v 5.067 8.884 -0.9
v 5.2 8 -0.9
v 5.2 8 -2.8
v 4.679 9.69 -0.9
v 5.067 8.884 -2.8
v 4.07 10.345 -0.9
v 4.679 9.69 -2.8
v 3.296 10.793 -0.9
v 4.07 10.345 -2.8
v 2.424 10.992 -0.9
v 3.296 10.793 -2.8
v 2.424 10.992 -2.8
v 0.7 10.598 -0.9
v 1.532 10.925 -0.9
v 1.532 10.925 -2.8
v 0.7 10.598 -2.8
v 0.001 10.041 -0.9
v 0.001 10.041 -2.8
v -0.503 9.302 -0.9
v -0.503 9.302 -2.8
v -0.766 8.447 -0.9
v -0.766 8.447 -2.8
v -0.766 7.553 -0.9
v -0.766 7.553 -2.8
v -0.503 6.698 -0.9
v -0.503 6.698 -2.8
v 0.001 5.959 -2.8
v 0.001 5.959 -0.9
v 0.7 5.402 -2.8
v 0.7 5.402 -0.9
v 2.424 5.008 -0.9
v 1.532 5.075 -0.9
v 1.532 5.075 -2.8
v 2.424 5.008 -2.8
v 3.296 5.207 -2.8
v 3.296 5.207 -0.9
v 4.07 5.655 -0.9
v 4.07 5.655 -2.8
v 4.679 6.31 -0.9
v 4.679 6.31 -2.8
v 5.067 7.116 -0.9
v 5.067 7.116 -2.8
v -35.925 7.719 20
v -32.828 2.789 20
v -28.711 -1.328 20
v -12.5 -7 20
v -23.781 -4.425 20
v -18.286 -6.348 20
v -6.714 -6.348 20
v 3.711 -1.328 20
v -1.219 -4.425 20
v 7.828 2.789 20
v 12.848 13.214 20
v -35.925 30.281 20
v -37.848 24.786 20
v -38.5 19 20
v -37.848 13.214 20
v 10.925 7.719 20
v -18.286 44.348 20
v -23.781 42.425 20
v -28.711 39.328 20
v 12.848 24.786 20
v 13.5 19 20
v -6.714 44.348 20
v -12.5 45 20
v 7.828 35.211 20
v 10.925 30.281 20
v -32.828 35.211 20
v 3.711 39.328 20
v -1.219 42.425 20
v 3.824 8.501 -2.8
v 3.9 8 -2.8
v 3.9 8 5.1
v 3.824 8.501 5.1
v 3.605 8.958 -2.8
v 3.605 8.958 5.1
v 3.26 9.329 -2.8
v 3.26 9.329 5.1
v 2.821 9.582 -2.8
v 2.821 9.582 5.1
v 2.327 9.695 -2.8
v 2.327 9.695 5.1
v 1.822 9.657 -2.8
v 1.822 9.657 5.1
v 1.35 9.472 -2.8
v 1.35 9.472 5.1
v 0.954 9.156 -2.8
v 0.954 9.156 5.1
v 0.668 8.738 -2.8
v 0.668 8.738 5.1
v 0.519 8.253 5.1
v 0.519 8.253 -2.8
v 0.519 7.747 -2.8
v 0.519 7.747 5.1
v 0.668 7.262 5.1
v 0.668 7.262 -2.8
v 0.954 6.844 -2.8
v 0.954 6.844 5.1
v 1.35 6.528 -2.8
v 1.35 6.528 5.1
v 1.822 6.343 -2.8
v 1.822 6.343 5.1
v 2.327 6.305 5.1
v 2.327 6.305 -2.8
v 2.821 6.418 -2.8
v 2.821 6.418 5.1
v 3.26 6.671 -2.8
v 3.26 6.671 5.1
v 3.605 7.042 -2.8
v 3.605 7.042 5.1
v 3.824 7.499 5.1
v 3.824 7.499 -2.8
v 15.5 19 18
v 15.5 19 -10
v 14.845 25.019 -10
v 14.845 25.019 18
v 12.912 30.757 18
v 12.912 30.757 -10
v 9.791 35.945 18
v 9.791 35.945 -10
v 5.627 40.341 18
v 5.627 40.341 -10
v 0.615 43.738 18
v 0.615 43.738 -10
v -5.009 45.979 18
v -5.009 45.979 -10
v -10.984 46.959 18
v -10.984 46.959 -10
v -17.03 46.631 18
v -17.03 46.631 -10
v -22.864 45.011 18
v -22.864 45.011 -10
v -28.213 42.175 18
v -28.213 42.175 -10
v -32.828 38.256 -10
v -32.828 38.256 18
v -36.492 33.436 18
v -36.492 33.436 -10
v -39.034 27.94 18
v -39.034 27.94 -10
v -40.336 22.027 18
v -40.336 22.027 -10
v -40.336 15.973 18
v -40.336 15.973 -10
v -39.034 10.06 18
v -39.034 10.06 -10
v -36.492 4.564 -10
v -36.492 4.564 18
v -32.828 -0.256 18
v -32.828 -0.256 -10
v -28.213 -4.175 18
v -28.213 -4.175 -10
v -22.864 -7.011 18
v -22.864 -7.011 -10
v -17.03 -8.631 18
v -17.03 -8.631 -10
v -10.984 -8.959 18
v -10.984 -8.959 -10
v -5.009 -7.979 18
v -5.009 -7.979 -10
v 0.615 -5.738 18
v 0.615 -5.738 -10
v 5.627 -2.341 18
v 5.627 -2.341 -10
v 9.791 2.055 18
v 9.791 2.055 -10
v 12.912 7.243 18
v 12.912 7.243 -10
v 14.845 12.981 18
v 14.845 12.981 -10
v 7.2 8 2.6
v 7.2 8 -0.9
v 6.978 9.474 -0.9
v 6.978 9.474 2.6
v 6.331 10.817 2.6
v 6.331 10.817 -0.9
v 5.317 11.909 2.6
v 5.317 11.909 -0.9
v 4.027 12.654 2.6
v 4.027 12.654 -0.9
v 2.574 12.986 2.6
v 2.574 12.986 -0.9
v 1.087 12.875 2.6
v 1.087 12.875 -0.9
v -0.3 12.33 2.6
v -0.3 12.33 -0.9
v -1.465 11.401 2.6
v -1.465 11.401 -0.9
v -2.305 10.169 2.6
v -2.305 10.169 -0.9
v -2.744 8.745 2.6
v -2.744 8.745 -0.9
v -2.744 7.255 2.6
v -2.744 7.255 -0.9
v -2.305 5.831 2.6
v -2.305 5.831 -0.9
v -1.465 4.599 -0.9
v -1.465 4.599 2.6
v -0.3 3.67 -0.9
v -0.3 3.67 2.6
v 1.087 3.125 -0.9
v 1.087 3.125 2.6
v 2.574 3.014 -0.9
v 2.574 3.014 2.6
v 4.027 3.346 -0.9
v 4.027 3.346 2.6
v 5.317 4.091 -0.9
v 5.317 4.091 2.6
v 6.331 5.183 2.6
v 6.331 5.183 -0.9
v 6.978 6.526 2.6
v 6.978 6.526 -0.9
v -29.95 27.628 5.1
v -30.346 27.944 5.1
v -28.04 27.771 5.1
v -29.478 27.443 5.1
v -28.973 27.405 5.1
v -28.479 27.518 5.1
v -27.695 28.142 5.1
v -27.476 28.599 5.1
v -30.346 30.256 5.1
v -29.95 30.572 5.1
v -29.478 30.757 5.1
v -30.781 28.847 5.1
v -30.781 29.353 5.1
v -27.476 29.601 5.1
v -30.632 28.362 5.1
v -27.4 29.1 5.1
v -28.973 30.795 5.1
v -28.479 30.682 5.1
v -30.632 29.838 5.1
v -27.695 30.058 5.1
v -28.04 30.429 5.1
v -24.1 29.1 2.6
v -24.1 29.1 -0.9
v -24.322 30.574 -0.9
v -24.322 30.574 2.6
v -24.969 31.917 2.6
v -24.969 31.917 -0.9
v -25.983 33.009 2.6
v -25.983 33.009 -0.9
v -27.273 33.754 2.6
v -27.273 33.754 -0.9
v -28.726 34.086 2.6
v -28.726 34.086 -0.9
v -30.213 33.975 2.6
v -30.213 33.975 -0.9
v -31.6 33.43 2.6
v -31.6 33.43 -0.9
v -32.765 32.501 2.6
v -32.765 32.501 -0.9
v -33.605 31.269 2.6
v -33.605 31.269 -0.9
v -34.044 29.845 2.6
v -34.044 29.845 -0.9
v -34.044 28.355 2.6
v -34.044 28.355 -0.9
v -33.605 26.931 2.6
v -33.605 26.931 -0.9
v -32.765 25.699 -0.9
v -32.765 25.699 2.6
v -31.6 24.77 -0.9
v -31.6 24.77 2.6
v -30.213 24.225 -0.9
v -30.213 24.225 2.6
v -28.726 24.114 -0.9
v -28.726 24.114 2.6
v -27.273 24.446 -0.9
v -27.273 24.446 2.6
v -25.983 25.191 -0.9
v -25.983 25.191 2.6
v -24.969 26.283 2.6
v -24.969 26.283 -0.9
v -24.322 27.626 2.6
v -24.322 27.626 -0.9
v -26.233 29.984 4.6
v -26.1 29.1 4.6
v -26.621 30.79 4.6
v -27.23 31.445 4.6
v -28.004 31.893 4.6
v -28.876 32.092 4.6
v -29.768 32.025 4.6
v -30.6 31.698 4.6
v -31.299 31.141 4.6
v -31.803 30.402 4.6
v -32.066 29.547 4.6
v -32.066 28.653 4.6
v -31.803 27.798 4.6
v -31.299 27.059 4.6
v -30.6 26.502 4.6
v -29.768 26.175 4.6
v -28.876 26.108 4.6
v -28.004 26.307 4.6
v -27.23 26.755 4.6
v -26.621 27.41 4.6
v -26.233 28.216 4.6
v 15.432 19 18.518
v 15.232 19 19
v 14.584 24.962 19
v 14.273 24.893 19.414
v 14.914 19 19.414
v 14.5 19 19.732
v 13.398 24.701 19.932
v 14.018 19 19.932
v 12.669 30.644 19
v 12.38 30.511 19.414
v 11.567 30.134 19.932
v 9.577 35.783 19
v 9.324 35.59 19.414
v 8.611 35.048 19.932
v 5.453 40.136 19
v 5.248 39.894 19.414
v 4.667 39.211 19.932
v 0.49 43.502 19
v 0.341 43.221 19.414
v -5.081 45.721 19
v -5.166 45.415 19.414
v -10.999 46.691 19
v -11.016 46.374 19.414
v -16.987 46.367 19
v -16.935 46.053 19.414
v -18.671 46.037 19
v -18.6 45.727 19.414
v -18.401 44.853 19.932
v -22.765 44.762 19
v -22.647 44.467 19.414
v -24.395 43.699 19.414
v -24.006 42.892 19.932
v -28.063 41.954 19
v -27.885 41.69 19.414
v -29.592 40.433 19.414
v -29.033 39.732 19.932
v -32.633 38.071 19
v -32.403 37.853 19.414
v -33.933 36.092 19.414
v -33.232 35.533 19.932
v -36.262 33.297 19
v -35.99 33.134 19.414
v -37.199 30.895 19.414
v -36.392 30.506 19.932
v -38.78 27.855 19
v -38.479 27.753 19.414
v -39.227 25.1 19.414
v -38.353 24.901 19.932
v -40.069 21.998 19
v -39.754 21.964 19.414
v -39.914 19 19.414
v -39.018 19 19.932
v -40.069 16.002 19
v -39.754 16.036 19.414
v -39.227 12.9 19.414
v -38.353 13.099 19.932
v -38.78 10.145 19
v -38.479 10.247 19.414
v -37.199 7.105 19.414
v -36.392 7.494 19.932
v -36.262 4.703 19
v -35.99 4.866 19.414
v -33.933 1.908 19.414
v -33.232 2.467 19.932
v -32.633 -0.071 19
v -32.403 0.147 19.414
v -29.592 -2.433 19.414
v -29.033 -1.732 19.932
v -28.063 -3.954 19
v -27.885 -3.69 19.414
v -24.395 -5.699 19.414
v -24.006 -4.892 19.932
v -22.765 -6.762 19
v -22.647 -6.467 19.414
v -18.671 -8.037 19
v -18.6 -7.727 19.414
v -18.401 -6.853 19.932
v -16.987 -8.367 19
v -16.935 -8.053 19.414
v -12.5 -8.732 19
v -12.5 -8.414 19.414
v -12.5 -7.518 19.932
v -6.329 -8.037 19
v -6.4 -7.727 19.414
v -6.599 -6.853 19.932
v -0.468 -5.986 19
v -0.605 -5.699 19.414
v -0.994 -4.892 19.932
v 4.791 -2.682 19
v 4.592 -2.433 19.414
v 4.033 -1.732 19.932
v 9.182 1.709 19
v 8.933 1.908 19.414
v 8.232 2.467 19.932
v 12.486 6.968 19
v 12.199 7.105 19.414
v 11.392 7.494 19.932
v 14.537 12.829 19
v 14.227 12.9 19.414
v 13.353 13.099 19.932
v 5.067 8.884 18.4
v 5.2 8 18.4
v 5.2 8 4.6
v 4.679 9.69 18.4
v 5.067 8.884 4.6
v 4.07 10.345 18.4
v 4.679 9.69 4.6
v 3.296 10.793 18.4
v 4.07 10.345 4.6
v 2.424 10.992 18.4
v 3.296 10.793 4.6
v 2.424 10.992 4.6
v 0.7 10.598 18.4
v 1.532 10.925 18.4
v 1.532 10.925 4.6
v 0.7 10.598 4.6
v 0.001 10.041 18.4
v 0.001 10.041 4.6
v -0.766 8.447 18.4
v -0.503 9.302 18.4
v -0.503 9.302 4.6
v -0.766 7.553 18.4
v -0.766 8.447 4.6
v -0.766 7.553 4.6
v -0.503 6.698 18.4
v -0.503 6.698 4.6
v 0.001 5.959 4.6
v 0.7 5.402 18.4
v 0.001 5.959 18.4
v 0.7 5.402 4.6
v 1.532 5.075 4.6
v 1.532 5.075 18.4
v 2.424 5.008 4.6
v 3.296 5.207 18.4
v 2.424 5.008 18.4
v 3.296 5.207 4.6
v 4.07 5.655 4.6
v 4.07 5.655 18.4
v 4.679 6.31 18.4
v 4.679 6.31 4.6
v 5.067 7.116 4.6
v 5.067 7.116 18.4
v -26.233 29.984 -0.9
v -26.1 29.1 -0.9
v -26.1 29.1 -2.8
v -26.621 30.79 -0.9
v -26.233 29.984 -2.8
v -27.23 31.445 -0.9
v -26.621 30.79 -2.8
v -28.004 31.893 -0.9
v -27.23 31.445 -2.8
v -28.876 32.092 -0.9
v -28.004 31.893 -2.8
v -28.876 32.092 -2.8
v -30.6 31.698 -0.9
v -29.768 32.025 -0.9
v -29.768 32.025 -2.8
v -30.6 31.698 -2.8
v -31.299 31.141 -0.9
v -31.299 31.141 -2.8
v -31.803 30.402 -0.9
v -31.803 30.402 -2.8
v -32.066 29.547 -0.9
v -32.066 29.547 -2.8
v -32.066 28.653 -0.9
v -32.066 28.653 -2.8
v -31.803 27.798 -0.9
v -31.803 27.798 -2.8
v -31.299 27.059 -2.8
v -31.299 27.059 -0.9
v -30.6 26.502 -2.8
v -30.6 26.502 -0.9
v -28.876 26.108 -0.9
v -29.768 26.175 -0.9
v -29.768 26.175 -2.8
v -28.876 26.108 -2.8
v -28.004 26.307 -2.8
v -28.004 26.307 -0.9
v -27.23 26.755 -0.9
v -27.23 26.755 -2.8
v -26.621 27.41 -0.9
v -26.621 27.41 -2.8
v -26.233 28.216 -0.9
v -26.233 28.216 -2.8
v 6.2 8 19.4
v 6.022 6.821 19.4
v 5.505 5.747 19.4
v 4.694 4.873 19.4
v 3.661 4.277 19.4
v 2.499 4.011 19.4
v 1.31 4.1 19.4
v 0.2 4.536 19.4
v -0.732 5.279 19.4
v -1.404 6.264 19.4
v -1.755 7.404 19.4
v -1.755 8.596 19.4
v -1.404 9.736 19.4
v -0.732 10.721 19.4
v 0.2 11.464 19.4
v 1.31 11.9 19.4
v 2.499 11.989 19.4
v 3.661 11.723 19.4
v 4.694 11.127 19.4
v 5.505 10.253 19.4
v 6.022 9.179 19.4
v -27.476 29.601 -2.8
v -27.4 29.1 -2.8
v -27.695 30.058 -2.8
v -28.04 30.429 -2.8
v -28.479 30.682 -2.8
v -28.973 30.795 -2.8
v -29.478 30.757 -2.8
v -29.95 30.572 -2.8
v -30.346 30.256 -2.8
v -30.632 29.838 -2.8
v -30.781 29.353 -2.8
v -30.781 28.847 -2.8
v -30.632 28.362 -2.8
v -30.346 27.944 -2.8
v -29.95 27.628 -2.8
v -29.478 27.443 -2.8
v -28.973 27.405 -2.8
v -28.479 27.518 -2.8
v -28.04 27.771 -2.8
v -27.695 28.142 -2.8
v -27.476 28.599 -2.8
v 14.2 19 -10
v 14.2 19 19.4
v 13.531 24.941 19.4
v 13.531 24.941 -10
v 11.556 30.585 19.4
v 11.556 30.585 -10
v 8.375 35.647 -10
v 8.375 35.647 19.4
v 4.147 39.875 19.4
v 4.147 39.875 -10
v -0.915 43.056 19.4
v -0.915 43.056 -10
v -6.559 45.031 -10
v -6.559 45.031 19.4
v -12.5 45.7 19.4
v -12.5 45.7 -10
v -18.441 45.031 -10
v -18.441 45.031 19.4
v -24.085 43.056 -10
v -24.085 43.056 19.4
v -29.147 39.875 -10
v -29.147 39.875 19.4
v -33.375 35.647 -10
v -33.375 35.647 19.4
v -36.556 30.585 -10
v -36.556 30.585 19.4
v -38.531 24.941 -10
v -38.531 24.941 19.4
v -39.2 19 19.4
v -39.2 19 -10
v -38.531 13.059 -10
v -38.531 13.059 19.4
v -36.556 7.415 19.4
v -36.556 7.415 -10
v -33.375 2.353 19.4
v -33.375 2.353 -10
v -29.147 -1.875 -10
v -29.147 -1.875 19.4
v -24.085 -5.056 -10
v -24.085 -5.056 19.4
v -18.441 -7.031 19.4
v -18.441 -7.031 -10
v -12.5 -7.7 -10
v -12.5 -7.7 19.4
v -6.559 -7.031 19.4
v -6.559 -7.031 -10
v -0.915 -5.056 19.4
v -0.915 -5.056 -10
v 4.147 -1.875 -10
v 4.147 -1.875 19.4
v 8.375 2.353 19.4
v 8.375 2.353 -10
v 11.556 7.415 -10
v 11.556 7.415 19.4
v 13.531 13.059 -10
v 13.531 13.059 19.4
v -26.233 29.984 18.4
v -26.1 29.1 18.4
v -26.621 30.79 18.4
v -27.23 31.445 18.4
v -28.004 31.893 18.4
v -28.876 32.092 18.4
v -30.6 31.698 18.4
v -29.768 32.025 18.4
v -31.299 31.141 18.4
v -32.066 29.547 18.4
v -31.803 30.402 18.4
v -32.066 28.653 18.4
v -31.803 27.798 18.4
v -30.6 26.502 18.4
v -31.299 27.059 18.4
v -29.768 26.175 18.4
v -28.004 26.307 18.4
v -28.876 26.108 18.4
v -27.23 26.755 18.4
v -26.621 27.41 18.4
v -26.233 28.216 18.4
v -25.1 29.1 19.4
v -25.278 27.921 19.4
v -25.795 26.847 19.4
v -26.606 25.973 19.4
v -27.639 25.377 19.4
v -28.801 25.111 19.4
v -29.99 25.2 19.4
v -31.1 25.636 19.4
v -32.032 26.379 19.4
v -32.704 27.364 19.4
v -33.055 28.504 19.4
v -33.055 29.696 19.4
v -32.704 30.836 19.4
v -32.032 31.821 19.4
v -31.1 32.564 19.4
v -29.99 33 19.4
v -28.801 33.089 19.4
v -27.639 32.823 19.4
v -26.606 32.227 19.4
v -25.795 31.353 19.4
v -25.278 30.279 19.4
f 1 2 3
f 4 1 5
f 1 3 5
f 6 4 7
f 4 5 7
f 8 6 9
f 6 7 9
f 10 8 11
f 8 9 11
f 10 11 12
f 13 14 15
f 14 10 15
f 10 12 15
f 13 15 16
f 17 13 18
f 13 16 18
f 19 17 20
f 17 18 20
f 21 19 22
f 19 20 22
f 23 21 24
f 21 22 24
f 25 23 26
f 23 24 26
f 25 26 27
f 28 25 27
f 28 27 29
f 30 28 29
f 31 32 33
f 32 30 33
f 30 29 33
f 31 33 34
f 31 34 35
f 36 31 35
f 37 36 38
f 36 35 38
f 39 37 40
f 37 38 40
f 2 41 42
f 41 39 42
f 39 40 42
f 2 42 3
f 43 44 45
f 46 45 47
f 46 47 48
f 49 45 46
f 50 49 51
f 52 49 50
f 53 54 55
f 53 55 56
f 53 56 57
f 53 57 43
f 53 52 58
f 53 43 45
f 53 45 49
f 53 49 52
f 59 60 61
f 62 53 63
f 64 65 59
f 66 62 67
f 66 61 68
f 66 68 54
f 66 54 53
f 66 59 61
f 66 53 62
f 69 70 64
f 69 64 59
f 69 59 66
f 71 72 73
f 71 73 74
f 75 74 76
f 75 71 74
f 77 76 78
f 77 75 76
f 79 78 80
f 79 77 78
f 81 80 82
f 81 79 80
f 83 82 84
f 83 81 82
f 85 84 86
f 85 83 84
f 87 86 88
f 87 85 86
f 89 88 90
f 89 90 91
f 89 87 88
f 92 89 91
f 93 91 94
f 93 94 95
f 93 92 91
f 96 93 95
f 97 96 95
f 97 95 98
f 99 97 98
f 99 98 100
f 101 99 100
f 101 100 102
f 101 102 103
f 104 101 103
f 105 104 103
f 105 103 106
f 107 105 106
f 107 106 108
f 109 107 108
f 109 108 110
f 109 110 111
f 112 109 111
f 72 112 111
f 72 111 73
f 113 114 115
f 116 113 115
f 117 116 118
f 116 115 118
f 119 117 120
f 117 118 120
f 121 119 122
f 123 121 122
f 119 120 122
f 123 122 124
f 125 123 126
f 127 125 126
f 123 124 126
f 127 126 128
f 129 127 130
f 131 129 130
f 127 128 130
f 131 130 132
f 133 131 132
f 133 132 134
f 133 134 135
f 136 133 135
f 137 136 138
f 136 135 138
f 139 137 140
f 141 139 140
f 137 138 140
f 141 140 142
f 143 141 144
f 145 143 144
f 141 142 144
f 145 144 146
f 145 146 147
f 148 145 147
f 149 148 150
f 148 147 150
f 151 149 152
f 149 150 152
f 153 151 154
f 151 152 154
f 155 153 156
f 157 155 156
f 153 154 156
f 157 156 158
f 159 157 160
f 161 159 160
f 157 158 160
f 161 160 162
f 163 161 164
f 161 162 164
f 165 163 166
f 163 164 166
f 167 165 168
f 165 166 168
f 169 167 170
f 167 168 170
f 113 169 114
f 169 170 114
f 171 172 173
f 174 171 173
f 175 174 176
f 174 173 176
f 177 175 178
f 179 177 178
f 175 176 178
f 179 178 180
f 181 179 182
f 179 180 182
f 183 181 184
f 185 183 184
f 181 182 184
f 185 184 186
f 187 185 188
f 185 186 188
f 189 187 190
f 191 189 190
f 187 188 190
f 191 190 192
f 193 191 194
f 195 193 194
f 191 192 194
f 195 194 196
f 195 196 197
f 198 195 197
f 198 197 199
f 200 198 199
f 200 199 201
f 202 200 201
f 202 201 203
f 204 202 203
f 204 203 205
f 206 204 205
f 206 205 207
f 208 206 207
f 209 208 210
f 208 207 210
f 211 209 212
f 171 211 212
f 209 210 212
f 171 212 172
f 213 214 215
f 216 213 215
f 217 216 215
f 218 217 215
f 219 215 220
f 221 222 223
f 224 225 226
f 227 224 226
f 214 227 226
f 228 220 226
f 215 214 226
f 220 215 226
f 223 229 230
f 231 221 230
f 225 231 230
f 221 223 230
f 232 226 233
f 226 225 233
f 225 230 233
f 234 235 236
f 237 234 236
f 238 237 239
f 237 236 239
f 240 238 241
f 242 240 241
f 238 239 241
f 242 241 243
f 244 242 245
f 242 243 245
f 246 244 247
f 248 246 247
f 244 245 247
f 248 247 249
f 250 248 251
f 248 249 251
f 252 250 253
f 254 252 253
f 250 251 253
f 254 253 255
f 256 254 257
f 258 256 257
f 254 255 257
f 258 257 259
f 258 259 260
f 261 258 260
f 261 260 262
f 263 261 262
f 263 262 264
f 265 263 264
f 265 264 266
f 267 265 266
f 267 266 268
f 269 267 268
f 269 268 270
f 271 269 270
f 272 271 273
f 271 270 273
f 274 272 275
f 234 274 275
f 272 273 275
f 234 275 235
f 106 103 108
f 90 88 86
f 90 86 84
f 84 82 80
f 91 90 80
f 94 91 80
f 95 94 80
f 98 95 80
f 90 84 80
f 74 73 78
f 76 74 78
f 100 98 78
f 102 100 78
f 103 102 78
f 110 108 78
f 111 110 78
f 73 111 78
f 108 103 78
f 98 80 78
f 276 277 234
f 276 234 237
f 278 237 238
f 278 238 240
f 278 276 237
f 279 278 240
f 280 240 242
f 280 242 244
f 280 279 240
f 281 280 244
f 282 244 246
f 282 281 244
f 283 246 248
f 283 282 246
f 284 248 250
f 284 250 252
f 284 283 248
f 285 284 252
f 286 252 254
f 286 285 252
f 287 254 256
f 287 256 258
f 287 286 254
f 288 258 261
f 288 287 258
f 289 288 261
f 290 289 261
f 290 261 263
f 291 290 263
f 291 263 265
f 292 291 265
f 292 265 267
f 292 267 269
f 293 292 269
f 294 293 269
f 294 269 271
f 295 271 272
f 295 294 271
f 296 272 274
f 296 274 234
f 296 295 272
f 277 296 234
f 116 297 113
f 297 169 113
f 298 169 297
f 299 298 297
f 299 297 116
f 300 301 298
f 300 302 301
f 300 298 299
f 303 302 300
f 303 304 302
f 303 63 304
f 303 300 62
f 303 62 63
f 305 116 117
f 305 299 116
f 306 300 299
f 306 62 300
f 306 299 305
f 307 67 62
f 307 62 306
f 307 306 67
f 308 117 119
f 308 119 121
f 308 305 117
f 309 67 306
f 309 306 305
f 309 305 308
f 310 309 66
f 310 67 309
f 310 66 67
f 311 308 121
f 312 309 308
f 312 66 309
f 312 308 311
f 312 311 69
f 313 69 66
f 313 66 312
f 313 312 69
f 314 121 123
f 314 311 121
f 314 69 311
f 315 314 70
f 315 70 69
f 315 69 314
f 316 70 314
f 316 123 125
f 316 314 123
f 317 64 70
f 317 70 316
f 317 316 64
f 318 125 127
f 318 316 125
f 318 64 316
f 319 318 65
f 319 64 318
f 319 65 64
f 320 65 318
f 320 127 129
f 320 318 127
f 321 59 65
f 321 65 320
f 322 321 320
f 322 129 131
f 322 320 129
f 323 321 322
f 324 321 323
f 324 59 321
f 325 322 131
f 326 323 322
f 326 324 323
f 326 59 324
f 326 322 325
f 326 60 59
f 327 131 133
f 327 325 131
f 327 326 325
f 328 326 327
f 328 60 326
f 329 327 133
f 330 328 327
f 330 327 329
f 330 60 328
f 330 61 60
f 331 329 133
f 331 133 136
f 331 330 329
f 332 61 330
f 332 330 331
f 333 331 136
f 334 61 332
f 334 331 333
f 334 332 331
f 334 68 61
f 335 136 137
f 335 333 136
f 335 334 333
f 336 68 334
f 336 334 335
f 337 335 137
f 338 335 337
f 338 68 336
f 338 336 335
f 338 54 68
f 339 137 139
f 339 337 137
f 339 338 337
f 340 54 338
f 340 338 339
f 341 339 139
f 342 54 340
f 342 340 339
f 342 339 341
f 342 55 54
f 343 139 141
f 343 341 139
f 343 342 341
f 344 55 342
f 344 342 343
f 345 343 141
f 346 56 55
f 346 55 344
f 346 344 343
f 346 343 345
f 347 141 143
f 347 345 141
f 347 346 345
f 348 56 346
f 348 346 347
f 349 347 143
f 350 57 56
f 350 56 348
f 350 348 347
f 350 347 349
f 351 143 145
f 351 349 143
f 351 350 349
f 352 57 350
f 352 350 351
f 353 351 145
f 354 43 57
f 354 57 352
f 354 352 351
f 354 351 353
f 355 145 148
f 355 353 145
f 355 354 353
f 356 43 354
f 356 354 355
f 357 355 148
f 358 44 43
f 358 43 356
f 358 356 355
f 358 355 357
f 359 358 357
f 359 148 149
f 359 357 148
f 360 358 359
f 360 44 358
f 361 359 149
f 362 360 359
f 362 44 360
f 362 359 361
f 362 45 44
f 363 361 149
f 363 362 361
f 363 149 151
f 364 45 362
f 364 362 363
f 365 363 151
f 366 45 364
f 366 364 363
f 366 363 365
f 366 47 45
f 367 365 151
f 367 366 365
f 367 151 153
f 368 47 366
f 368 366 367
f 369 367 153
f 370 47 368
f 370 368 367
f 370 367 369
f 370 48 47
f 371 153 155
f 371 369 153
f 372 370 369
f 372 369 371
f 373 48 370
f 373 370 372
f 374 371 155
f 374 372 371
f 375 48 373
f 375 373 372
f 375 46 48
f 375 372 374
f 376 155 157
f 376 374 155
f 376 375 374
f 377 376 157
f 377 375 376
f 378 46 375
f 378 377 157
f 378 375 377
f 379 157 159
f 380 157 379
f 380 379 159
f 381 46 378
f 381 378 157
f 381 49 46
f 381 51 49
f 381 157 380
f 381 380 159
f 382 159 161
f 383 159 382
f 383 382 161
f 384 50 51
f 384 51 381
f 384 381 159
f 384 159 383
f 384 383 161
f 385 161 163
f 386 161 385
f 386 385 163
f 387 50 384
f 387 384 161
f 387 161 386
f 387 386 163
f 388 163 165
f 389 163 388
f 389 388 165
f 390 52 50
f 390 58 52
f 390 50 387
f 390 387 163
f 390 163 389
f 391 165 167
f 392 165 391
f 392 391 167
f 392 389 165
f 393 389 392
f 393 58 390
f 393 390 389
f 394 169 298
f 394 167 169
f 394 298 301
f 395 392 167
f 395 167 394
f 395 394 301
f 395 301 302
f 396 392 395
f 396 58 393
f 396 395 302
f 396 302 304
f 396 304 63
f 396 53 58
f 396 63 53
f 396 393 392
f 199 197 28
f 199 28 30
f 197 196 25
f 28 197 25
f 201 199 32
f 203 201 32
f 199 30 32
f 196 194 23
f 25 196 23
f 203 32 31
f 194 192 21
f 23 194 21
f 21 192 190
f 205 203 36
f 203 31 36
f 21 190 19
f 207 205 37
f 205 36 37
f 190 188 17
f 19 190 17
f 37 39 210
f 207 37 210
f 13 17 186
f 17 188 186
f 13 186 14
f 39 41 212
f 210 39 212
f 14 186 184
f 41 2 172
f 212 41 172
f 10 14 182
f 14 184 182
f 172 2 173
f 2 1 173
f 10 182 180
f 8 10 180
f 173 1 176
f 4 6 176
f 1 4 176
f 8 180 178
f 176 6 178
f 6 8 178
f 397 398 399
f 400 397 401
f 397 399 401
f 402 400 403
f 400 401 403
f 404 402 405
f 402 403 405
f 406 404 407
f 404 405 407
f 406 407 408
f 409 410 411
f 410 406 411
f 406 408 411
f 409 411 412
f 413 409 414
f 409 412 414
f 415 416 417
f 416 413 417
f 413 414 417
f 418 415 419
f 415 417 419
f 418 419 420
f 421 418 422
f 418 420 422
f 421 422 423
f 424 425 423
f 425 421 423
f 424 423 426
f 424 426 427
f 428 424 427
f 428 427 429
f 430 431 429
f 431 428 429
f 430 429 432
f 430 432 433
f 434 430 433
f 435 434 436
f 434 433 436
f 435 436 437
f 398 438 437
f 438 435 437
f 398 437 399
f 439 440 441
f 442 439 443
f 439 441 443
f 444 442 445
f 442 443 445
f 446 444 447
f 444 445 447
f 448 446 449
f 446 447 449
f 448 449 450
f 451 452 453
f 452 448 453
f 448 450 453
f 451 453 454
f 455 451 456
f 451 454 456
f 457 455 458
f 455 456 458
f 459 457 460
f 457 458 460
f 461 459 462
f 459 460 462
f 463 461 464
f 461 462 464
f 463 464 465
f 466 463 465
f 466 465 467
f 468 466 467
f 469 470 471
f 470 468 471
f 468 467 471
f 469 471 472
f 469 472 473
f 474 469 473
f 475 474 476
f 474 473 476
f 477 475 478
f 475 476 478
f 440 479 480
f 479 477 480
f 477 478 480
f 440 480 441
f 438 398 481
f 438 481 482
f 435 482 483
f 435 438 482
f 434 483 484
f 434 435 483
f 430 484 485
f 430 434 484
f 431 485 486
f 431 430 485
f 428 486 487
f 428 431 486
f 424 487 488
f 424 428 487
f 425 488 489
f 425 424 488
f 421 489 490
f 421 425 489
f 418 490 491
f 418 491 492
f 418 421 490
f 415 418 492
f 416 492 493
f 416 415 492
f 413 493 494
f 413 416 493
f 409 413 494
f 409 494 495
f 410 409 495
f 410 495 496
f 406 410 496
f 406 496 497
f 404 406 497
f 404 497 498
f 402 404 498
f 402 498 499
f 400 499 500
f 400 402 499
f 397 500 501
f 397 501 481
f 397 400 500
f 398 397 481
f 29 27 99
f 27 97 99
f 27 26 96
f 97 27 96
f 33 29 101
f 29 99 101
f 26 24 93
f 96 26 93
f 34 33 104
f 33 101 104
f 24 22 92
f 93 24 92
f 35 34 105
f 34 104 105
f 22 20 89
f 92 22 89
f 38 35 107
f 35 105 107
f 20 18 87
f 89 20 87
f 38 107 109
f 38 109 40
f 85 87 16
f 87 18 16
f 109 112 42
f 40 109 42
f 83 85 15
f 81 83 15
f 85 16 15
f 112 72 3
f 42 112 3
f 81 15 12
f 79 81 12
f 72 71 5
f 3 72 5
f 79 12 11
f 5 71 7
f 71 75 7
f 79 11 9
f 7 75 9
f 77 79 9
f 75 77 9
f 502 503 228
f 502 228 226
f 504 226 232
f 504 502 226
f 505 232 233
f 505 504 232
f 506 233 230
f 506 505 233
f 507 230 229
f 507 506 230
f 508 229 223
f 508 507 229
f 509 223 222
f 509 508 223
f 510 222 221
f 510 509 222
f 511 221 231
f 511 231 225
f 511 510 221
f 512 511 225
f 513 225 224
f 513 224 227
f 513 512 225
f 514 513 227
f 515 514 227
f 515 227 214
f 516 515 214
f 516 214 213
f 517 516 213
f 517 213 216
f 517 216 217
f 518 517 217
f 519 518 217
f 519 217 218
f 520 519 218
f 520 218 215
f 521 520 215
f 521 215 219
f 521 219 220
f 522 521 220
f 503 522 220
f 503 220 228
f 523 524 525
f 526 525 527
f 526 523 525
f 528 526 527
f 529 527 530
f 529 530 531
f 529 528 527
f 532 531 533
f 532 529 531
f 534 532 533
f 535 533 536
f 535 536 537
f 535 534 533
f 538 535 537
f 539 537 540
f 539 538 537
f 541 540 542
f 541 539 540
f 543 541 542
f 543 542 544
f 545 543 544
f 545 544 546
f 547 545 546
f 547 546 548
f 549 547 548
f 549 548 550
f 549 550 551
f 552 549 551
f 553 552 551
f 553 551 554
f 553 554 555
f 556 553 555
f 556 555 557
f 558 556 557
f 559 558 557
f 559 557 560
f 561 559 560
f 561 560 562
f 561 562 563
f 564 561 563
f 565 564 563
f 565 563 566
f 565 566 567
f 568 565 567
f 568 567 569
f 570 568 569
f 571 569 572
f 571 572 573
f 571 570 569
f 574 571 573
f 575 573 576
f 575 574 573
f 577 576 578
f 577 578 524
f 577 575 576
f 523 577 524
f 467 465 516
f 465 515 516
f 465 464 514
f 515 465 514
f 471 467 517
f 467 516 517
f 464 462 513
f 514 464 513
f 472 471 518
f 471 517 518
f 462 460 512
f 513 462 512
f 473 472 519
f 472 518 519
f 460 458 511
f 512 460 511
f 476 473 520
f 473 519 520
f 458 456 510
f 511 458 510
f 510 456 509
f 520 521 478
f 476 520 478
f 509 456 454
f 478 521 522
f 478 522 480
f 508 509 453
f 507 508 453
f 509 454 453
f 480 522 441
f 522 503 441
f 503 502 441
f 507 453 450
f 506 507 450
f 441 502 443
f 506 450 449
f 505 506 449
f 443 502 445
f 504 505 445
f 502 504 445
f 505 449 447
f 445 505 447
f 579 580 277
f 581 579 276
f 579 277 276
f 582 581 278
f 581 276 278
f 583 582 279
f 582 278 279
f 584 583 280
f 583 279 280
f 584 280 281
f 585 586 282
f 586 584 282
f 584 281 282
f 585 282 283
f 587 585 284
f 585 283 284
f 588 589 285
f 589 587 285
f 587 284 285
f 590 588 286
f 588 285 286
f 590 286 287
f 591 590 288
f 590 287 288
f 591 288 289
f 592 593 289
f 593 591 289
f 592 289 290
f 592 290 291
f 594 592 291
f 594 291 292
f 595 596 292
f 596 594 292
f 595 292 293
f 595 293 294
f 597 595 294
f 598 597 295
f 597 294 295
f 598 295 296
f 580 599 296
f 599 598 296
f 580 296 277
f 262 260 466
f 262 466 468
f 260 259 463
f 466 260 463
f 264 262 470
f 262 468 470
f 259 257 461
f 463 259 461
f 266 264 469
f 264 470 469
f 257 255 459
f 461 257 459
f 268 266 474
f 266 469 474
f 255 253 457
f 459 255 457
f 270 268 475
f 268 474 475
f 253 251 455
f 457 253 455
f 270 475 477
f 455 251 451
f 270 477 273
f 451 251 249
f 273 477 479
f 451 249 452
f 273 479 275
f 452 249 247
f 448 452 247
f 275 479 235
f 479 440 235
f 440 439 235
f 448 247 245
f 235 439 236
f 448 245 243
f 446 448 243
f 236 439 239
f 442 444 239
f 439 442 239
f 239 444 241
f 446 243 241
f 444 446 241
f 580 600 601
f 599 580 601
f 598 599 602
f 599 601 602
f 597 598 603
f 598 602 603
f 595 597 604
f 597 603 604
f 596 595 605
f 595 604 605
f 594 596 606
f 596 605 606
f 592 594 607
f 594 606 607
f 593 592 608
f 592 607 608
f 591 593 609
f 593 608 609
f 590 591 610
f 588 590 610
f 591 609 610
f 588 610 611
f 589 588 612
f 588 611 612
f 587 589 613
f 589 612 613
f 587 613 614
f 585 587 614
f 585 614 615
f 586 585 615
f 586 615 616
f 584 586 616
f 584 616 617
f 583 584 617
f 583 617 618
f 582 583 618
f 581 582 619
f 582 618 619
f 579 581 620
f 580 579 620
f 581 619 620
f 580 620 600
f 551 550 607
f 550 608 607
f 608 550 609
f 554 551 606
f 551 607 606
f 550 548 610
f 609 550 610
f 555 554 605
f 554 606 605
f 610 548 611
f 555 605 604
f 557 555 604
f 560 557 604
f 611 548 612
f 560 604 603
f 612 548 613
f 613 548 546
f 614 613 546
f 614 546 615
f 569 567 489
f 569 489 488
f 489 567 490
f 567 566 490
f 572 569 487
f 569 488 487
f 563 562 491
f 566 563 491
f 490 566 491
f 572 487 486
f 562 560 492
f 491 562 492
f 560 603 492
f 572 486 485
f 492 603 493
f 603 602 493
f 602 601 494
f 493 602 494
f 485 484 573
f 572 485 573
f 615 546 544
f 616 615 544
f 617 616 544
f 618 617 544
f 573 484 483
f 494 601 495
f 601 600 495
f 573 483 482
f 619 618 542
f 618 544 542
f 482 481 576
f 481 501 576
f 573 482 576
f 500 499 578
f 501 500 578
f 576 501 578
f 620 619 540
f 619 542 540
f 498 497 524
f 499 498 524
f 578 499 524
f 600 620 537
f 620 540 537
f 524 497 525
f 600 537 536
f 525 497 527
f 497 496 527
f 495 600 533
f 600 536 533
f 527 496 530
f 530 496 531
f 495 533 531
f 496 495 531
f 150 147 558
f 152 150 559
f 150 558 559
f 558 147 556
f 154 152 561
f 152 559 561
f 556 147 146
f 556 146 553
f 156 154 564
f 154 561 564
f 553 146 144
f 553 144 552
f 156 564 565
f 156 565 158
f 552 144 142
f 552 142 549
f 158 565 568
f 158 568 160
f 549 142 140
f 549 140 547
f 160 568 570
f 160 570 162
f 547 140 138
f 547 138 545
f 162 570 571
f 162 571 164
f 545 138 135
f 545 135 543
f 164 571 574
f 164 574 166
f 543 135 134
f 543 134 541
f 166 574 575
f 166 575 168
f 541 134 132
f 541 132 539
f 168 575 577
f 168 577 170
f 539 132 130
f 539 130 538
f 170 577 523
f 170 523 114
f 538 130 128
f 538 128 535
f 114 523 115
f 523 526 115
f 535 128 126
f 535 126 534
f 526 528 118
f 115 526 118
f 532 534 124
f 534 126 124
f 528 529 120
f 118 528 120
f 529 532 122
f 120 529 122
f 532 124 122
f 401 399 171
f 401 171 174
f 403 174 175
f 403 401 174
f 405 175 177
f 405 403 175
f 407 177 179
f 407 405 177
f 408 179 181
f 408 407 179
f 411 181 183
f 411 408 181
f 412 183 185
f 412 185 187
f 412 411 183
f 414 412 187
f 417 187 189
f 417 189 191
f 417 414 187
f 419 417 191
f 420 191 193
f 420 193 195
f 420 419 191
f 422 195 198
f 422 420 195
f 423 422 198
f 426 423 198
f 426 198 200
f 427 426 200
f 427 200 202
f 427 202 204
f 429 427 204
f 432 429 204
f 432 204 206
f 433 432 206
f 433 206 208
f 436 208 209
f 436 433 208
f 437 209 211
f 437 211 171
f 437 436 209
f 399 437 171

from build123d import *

# Parameters (mm, degrees)
CYLINDER033_R     = 1.7
CYLINDER033_DEPTH = 8.5
CYLINDER036_R     = 5
CYLINDER036_DEPTH = 5.5
CHAMFER008_SIZE   = 2
CYLINDER031_R     = 3
CYLINDER031_DEPTH = 22.5
CYLINDER034_R     = 1.7
CYLINDER034_DEPTH = 8.5
CYLINDER035_R     = 5
CYLINDER035_DEPTH = 5.5
CHAMFER009_SIZE   = 2
CYLINDER032_R     = 3
CYLINDER032_DEPTH = 22.5
CYLINDER029_R     = 26.7
CYLINDER029_DEPTH = 30
CYLINDER030_R     = 28
CYLINDER030_DEPTH = 30
FILLET002_R       = 2
CHAMFER010_SIZE   = 1


with BuildPart() as vaciado_tope014:
    # Cylinder033 → Cylinder033 (new body)
    with BuildSketch(Plane(origin=(2.2, 8, -3.4), x_dir=(1, 0, 0), z_dir=(0, 0, 1))):
        Circle(CYLINDER033_R)
    extrude(amount=CYLINDER033_DEPTH)


with BuildPart() as chamfer008:
    # Cylinder036 → Cylinder036 (new body)
    with BuildSketch(Plane(origin=(2.2, 8, -0.9), x_dir=(1, 0, 0), z_dir=(0, 0, 1))):
        Circle(CYLINDER036_R)
    extrude(amount=CYLINDER036_DEPTH)

    # Chamfer008
    chamfer008_edges = [chamfer008.edges().sort_by_distance(p)[0] for p in [
        (-2.8, 8, 4.6),
    ]]
    chamfer(chamfer008_edges, length=CHAMFER008_SIZE)


with BuildPart() as columna1:
    # Cylinder031 → Cylinder031 (new body)
    with BuildSketch(Plane(origin=(2.2, 8, -2.8), x_dir=(1, 0, 0), z_dir=(0, 0, 1))):
        Circle(CYLINDER031_R)
    extrude(amount=CYLINDER031_DEPTH)

    # Fusion003: union Chamfer008
    add(chamfer008.part)

    # Cut017: cut vaciado tope014
    add(vaciado_tope014.part, mode=Mode.SUBTRACT)


with BuildPart() as vaciado_tope015:
    # Cylinder034 → Cylinder034 (new body)
    with BuildSketch(Plane(origin=(-29.1, 29.1, -3.4), x_dir=(1, 0, 0), z_dir=(0, 0, 1))):
        Circle(CYLINDER034_R)
    extrude(amount=CYLINDER034_DEPTH)


with BuildPart() as chamfer009:
    # Cylinder035 → Cylinder035 (new body)
    with BuildSketch(Plane(origin=(-29.1, 29.1, -0.9), x_dir=(1, 0, 0), z_dir=(0, 0, 1))):
        Circle(CYLINDER035_R)
    extrude(amount=CYLINDER035_DEPTH)

    # Chamfer009
    chamfer009_edges = [chamfer009.edges().sort_by_distance(p)[0] for p in [
        (-34.1, 29.1, 4.6),
    ]]
    chamfer(chamfer009_edges, length=CHAMFER009_SIZE)


with BuildPart() as columna2:
    # Cylinder032 → Cylinder032 (new body)
    with BuildSketch(Plane(origin=(-29.1, 29.1, -2.8), x_dir=(1, 0, 0), z_dir=(0, 0, 1))):
        Circle(CYLINDER032_R)
    extrude(amount=CYLINDER032_DEPTH)

    # Fusion004: union Chamfer009
    add(chamfer009.part)

    # Cut018: cut vaciado tope015
    add(vaciado_tope015.part, mode=Mode.SUBTRACT)


with BuildPart() as base_exterior_vaciado002:
    # Cylinder029 → Cylinder029 (new body)
    with BuildSketch(Plane(origin=(-12.5, 19, -10.6), x_dir=(1, 0, 0), z_dir=(0, 0, 1))):
        Circle(CYLINDER029_R)
    extrude(amount=CYLINDER029_DEPTH)


with BuildPart() as base_version_ok_pilares001:
    # Cylinder030 → Cylinder030 (new body)
    with BuildSketch(Plane(origin=(-12.5, 19, -10), x_dir=(1, 0, 0), z_dir=(0, 0, 1))):
        Circle(CYLINDER030_R)
    extrude(amount=CYLINDER030_DEPTH)

    # Cut016: cut base exterior vaciado002
    add(base_exterior_vaciado002.part, mode=Mode.SUBTRACT)

    # Fillet002
    fillet002_edges = [base_version_ok_pilares001.edges().sort_by_distance(p)[0] for p in [
        (-40.5, 19, 20),
    ]]
    fillet(fillet002_edges, radius=FILLET002_R)

    # Fusion005: union columna1, columna2
    add(columna1.part)
    add(columna2.part)

    # Chamfer010
    chamfer010_edges = [base_version_ok_pilares001.edges().sort_by_distance(p)[0] for p in [
        (-0.8, 8, 19.4),
        (-32.1, 29.1, 19.4),
    ]]
    chamfer(chamfer010_edges, length=CHAMFER010_SIZE)


solid = base_version_ok_pilares001.part
